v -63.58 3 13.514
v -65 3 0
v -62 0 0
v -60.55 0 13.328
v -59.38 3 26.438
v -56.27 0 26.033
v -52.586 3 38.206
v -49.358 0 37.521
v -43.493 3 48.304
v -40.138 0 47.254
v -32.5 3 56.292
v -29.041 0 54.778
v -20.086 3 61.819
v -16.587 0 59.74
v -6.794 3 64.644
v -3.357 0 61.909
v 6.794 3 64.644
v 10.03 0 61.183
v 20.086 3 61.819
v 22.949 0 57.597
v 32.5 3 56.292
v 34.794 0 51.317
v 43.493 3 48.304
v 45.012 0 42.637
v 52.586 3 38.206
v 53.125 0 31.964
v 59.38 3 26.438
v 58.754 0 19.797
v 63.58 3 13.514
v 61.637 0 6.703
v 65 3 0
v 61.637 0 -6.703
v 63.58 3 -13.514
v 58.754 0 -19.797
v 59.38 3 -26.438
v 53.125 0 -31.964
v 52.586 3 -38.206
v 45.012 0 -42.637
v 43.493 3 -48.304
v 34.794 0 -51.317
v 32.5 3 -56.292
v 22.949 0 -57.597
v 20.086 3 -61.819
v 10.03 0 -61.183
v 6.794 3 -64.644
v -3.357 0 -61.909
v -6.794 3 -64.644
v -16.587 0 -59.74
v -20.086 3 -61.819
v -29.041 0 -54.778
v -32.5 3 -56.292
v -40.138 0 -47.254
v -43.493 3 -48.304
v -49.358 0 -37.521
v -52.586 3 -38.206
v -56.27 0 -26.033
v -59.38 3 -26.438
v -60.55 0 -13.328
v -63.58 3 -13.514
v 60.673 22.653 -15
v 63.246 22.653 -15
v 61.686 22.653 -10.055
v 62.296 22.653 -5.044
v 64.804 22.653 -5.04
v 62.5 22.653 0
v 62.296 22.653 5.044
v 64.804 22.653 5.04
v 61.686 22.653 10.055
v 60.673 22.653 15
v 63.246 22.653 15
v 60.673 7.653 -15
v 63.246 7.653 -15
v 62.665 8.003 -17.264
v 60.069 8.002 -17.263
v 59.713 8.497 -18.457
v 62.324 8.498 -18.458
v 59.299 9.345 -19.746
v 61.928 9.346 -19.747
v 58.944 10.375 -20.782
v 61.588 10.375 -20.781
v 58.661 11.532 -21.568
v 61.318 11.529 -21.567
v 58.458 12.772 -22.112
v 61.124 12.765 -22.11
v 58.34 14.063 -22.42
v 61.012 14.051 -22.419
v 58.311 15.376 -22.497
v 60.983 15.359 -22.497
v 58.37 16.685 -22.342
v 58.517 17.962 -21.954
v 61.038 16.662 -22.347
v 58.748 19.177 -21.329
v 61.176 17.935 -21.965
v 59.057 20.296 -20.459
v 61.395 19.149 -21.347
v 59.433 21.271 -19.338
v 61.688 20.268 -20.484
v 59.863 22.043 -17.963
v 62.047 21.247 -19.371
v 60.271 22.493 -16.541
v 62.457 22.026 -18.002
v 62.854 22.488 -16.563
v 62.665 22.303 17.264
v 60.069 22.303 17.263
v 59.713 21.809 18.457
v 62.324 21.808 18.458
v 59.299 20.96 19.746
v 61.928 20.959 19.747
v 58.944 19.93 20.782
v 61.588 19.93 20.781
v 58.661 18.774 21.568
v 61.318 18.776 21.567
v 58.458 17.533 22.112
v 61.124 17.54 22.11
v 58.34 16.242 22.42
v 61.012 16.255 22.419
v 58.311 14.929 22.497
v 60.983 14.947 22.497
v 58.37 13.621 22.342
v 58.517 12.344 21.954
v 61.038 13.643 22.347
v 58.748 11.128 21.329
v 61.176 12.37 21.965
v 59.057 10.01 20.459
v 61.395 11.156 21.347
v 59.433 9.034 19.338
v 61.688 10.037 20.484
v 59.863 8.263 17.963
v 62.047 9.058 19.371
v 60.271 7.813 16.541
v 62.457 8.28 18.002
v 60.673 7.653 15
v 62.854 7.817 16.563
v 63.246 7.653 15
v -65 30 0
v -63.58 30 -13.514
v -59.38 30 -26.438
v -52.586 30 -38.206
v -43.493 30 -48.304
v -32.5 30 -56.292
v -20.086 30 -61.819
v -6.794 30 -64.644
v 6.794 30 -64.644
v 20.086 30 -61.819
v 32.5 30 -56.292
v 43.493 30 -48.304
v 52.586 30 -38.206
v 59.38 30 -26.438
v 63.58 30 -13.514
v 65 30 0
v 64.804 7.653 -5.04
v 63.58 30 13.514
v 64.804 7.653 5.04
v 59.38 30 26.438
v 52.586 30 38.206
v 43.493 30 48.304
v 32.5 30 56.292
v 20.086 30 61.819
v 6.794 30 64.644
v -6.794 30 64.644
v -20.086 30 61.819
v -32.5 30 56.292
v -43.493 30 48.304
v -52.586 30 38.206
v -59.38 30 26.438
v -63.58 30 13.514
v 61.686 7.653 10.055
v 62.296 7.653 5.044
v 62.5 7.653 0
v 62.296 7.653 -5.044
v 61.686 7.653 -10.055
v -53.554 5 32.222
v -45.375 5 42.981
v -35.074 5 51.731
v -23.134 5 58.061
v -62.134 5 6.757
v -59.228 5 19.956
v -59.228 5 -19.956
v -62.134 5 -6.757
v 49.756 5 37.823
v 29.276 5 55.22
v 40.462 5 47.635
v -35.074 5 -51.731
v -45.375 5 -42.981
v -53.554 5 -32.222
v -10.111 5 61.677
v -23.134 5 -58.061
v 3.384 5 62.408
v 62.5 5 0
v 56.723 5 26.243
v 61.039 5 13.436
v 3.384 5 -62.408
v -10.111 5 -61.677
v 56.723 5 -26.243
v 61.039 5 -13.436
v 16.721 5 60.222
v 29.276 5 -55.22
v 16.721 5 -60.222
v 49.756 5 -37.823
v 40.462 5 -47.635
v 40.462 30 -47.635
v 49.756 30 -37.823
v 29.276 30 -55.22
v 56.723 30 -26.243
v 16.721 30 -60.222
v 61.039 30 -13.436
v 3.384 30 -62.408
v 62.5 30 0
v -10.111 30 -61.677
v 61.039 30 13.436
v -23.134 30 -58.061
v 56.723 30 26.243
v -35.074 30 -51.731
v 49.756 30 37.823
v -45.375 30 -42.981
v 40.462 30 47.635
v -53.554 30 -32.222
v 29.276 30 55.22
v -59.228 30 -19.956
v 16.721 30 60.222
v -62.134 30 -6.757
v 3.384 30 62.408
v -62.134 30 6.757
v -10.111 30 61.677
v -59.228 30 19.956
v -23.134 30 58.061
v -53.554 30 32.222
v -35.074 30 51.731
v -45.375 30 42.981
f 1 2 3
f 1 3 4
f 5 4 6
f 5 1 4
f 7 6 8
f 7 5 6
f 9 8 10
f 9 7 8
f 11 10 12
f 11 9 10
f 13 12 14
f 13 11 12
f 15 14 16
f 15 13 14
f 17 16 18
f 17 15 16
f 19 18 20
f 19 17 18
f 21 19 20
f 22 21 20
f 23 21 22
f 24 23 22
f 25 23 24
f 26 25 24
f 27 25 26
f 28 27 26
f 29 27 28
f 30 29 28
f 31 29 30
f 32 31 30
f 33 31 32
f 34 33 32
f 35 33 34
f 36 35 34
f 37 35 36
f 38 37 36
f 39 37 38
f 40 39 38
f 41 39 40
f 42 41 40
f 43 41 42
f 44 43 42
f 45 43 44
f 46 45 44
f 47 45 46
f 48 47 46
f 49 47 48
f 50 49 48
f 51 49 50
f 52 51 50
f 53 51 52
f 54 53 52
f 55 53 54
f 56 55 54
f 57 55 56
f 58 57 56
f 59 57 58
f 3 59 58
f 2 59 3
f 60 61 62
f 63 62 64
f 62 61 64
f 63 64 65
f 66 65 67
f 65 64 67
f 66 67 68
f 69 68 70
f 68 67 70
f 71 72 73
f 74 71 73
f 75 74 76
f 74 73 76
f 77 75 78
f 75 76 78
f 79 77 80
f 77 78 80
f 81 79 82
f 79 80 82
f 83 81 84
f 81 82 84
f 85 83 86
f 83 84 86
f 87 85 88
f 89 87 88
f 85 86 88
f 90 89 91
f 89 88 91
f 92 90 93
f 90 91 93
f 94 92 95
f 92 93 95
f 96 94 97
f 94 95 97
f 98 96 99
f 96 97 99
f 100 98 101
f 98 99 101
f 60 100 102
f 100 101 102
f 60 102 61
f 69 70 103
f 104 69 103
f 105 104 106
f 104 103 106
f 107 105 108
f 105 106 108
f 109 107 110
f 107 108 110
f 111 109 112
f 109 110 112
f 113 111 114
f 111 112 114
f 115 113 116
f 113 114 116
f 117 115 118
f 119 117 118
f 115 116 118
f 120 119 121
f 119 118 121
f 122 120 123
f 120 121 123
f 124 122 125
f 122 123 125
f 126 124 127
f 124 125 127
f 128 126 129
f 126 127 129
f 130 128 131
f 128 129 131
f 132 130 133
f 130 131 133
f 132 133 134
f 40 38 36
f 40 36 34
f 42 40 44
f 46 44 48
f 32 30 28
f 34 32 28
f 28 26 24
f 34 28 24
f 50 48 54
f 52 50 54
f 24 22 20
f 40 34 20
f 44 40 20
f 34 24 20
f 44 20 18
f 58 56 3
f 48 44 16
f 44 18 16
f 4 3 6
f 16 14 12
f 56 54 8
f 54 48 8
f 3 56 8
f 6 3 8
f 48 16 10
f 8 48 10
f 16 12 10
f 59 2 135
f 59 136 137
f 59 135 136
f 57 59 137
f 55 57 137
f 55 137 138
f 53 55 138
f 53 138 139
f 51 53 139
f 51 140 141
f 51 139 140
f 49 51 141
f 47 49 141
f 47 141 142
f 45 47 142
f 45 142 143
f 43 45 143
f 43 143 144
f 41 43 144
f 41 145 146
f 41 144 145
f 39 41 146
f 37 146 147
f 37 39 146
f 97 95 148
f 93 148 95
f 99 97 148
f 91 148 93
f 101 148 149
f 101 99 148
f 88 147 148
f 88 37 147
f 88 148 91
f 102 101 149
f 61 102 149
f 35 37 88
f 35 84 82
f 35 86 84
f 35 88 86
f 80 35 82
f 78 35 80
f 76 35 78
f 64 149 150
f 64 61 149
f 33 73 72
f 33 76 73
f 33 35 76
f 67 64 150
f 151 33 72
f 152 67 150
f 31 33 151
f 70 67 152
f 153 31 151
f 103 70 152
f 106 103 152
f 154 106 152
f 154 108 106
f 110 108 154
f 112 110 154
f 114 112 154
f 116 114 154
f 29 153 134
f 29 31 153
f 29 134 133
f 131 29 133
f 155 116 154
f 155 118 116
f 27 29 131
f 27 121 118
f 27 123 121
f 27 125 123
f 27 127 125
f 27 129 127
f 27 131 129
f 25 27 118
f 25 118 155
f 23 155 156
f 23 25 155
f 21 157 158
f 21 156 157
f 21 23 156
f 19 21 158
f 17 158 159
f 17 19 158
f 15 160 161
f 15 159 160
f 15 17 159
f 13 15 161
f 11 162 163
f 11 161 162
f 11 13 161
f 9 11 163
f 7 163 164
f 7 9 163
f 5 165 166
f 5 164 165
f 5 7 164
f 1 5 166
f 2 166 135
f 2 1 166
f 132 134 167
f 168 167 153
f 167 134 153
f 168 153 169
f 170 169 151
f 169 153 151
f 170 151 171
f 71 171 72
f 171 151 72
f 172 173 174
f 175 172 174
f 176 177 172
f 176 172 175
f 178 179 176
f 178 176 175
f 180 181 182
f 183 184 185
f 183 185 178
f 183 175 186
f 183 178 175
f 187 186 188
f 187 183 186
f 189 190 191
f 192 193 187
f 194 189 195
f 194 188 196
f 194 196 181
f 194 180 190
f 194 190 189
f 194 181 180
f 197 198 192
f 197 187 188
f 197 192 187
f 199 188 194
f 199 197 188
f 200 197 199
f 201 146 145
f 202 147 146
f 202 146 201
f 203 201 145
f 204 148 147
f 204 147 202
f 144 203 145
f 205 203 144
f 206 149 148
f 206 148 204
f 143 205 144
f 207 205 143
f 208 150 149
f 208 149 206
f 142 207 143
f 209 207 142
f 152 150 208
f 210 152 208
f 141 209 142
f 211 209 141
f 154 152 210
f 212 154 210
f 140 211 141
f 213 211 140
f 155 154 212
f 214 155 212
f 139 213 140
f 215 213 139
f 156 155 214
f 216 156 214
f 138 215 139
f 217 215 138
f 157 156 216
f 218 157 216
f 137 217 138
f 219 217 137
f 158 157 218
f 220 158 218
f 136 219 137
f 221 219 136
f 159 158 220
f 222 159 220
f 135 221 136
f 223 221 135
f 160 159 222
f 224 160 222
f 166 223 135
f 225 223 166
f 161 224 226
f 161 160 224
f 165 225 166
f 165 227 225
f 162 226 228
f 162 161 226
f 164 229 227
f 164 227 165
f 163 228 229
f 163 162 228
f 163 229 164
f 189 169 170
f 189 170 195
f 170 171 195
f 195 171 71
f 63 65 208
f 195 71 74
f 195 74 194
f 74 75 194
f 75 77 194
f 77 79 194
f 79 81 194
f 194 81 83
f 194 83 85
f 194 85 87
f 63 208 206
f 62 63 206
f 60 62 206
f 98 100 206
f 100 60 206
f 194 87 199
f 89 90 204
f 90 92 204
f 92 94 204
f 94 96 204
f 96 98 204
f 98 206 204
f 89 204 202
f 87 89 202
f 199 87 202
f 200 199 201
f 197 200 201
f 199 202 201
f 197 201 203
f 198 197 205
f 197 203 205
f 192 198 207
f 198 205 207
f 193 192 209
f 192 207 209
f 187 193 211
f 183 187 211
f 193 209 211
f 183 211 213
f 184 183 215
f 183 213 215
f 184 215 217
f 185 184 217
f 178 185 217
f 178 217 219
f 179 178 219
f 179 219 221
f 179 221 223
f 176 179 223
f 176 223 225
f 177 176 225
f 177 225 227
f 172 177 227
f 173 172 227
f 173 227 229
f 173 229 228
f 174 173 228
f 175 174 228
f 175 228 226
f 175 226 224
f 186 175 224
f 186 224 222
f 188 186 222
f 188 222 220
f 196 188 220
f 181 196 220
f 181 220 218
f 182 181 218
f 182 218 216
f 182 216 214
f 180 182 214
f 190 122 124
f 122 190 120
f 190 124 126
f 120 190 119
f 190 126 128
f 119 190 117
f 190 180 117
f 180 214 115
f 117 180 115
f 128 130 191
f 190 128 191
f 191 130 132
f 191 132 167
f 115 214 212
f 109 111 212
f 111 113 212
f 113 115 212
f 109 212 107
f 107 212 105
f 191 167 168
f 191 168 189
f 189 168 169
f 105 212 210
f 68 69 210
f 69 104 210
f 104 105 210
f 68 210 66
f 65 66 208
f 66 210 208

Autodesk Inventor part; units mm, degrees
ref_plane "XY Plane" through (0, 0, 0) normal (0, 0, 1) x (1, 0, 0)
sketch "Sketch2" plane through (0, 0, 0) normal (0, 1, 0) x (-1, 0, 0)
  circle A0 centre (0, 0) radius 65
  dimension "d0" = 130
extrude "Extrusion1" add sketch "Sketch2" along normal blind 30
sketch "Sketch3" plane through (0, 30, 0) normal (0, 1, 0) x (1, 0, 0)
  circle A0 centre (0, 0) radius 62.5
  dimension "d3" = 125
extrude "Extrusion2" cut sketch "Sketch3" against normal blind 25
chamfer "Chamfer1" distance 3 angle 45 1 edges at (65, 0, 0)
sketch "Sketch4" plane through (0, 0, 0) normal (0, 1, 0) x (-1, 0, 0)
  line L0 (0, 0) -> (-65, 0)
  circle A0 centre (0, 0) radius 65 projected
ref_plane "Work Plane1" through (65, 0, 0) normal (1, 0, 0) x (0, 1, 0)
sketch "Sketch5" plane through (65, 0, 0) normal (1, 0, 0) x (0, 1, 0)
  line L0 (15.1527, 15) -> (15.1527, -15) construction
  line L1 (7.6527, 15) -> (7.6527, -15)
  line L2 (22.6527, -15) -> (22.6527, 15)
  arc A0 (22.6527, 15) -> (7.6527, 15) centre (15.1527, 15) ccw
  arc A1 (7.6527, -15) -> (22.6527, -15) centre (15.1527, -15) ccw
  point P0 (0, 0)
  point P1 (15.1527, 0)
  dimension "d9" = 15
  dimension "d10" = 15
extrude "Extrusion3" cut sketch "Sketch5" against normal blind 10
properties part number "Gehaeuse_prototyp"
